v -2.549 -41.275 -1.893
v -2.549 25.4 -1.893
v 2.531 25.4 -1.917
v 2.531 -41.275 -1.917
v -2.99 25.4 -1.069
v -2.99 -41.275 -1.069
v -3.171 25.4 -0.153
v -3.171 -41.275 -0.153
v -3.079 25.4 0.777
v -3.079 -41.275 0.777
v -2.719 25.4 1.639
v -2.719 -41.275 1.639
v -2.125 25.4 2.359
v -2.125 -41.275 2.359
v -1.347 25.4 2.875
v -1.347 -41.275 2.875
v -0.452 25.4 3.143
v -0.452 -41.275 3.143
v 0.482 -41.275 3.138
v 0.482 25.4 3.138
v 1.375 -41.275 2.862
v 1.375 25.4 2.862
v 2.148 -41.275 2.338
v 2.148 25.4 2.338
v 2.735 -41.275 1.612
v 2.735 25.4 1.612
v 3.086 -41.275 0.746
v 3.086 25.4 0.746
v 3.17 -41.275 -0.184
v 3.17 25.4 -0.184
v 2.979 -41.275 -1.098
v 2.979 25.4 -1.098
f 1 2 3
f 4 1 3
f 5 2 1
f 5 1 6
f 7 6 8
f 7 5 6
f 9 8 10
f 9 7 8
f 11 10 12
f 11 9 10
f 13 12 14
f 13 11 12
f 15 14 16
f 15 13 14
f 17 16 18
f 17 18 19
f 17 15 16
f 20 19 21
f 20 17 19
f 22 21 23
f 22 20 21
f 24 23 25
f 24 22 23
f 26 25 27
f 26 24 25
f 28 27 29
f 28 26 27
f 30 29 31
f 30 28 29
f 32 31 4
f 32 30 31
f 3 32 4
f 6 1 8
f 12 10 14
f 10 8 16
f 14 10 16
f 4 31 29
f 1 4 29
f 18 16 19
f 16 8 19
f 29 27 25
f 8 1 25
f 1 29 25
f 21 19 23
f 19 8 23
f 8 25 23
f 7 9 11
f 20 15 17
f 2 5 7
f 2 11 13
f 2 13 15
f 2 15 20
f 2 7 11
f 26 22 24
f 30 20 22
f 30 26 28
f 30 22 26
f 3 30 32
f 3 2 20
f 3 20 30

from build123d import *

# Parameters (mm, degrees)
SKETCH1_R           = 3.175
BOSS_EXTRUDE1_DEPTH = 41.275
CUT_EXTRUDE5_DEPTH  = 83.672025196
CUT_EXTRUDE8_DEPTH  = 15.875


with BuildPart() as part:
    # Sketch1 → Boss-Extrude1 (new, symmetric)
    with BuildSketch(Plane(origin=(0, 0, 0), x_dir=(1, 0, 0), z_dir=(0, 1, 0))):
        with Locations(Location((0, 0, 0), (0, 0, 270))):
            Circle(SKETCH1_R)
    extrude(amount=BOSS_EXTRUDE1_DEPTH, both=True)

    # Sketch2 → Cut-Extrude5 (cut, through all)
    with BuildSketch(Plane(origin=(0, 41.275, 0), x_dir=(1, 0, 0), z_dir=(0, 1, 0))):
        with BuildLine():
            Line((-2.549322464, 1.892506268), (2.530677536, 1.917366999))
            ThreePointArc((2.530677536, 1.917366999), (-0.015537771, 3.174961981), (-2.549322464, 1.892506268))
        make_face()
    extrude(amount=-CUT_EXTRUDE5_DEPTH, mode=Mode.SUBTRACT)

    # Sketch5 → Cut-Extrude8 (cut)
    with BuildSketch(Plane(origin=(0, 41.275, 0), x_dir=(1, 0, 0), z_dir=(0, 1, 0))):
        with BuildLine():
            Line((2.530677536, 1.917366999), (-2.549322464, 1.892506268))
            ThreePointArc((-2.549322464, 1.892506268), (0.015537771, -3.174961981), (2.530677536, 1.917366999))
        make_face()
    extrude(amount=-CUT_EXTRUDE8_DEPTH, mode=Mode.SUBTRACT)


solid = part.part
